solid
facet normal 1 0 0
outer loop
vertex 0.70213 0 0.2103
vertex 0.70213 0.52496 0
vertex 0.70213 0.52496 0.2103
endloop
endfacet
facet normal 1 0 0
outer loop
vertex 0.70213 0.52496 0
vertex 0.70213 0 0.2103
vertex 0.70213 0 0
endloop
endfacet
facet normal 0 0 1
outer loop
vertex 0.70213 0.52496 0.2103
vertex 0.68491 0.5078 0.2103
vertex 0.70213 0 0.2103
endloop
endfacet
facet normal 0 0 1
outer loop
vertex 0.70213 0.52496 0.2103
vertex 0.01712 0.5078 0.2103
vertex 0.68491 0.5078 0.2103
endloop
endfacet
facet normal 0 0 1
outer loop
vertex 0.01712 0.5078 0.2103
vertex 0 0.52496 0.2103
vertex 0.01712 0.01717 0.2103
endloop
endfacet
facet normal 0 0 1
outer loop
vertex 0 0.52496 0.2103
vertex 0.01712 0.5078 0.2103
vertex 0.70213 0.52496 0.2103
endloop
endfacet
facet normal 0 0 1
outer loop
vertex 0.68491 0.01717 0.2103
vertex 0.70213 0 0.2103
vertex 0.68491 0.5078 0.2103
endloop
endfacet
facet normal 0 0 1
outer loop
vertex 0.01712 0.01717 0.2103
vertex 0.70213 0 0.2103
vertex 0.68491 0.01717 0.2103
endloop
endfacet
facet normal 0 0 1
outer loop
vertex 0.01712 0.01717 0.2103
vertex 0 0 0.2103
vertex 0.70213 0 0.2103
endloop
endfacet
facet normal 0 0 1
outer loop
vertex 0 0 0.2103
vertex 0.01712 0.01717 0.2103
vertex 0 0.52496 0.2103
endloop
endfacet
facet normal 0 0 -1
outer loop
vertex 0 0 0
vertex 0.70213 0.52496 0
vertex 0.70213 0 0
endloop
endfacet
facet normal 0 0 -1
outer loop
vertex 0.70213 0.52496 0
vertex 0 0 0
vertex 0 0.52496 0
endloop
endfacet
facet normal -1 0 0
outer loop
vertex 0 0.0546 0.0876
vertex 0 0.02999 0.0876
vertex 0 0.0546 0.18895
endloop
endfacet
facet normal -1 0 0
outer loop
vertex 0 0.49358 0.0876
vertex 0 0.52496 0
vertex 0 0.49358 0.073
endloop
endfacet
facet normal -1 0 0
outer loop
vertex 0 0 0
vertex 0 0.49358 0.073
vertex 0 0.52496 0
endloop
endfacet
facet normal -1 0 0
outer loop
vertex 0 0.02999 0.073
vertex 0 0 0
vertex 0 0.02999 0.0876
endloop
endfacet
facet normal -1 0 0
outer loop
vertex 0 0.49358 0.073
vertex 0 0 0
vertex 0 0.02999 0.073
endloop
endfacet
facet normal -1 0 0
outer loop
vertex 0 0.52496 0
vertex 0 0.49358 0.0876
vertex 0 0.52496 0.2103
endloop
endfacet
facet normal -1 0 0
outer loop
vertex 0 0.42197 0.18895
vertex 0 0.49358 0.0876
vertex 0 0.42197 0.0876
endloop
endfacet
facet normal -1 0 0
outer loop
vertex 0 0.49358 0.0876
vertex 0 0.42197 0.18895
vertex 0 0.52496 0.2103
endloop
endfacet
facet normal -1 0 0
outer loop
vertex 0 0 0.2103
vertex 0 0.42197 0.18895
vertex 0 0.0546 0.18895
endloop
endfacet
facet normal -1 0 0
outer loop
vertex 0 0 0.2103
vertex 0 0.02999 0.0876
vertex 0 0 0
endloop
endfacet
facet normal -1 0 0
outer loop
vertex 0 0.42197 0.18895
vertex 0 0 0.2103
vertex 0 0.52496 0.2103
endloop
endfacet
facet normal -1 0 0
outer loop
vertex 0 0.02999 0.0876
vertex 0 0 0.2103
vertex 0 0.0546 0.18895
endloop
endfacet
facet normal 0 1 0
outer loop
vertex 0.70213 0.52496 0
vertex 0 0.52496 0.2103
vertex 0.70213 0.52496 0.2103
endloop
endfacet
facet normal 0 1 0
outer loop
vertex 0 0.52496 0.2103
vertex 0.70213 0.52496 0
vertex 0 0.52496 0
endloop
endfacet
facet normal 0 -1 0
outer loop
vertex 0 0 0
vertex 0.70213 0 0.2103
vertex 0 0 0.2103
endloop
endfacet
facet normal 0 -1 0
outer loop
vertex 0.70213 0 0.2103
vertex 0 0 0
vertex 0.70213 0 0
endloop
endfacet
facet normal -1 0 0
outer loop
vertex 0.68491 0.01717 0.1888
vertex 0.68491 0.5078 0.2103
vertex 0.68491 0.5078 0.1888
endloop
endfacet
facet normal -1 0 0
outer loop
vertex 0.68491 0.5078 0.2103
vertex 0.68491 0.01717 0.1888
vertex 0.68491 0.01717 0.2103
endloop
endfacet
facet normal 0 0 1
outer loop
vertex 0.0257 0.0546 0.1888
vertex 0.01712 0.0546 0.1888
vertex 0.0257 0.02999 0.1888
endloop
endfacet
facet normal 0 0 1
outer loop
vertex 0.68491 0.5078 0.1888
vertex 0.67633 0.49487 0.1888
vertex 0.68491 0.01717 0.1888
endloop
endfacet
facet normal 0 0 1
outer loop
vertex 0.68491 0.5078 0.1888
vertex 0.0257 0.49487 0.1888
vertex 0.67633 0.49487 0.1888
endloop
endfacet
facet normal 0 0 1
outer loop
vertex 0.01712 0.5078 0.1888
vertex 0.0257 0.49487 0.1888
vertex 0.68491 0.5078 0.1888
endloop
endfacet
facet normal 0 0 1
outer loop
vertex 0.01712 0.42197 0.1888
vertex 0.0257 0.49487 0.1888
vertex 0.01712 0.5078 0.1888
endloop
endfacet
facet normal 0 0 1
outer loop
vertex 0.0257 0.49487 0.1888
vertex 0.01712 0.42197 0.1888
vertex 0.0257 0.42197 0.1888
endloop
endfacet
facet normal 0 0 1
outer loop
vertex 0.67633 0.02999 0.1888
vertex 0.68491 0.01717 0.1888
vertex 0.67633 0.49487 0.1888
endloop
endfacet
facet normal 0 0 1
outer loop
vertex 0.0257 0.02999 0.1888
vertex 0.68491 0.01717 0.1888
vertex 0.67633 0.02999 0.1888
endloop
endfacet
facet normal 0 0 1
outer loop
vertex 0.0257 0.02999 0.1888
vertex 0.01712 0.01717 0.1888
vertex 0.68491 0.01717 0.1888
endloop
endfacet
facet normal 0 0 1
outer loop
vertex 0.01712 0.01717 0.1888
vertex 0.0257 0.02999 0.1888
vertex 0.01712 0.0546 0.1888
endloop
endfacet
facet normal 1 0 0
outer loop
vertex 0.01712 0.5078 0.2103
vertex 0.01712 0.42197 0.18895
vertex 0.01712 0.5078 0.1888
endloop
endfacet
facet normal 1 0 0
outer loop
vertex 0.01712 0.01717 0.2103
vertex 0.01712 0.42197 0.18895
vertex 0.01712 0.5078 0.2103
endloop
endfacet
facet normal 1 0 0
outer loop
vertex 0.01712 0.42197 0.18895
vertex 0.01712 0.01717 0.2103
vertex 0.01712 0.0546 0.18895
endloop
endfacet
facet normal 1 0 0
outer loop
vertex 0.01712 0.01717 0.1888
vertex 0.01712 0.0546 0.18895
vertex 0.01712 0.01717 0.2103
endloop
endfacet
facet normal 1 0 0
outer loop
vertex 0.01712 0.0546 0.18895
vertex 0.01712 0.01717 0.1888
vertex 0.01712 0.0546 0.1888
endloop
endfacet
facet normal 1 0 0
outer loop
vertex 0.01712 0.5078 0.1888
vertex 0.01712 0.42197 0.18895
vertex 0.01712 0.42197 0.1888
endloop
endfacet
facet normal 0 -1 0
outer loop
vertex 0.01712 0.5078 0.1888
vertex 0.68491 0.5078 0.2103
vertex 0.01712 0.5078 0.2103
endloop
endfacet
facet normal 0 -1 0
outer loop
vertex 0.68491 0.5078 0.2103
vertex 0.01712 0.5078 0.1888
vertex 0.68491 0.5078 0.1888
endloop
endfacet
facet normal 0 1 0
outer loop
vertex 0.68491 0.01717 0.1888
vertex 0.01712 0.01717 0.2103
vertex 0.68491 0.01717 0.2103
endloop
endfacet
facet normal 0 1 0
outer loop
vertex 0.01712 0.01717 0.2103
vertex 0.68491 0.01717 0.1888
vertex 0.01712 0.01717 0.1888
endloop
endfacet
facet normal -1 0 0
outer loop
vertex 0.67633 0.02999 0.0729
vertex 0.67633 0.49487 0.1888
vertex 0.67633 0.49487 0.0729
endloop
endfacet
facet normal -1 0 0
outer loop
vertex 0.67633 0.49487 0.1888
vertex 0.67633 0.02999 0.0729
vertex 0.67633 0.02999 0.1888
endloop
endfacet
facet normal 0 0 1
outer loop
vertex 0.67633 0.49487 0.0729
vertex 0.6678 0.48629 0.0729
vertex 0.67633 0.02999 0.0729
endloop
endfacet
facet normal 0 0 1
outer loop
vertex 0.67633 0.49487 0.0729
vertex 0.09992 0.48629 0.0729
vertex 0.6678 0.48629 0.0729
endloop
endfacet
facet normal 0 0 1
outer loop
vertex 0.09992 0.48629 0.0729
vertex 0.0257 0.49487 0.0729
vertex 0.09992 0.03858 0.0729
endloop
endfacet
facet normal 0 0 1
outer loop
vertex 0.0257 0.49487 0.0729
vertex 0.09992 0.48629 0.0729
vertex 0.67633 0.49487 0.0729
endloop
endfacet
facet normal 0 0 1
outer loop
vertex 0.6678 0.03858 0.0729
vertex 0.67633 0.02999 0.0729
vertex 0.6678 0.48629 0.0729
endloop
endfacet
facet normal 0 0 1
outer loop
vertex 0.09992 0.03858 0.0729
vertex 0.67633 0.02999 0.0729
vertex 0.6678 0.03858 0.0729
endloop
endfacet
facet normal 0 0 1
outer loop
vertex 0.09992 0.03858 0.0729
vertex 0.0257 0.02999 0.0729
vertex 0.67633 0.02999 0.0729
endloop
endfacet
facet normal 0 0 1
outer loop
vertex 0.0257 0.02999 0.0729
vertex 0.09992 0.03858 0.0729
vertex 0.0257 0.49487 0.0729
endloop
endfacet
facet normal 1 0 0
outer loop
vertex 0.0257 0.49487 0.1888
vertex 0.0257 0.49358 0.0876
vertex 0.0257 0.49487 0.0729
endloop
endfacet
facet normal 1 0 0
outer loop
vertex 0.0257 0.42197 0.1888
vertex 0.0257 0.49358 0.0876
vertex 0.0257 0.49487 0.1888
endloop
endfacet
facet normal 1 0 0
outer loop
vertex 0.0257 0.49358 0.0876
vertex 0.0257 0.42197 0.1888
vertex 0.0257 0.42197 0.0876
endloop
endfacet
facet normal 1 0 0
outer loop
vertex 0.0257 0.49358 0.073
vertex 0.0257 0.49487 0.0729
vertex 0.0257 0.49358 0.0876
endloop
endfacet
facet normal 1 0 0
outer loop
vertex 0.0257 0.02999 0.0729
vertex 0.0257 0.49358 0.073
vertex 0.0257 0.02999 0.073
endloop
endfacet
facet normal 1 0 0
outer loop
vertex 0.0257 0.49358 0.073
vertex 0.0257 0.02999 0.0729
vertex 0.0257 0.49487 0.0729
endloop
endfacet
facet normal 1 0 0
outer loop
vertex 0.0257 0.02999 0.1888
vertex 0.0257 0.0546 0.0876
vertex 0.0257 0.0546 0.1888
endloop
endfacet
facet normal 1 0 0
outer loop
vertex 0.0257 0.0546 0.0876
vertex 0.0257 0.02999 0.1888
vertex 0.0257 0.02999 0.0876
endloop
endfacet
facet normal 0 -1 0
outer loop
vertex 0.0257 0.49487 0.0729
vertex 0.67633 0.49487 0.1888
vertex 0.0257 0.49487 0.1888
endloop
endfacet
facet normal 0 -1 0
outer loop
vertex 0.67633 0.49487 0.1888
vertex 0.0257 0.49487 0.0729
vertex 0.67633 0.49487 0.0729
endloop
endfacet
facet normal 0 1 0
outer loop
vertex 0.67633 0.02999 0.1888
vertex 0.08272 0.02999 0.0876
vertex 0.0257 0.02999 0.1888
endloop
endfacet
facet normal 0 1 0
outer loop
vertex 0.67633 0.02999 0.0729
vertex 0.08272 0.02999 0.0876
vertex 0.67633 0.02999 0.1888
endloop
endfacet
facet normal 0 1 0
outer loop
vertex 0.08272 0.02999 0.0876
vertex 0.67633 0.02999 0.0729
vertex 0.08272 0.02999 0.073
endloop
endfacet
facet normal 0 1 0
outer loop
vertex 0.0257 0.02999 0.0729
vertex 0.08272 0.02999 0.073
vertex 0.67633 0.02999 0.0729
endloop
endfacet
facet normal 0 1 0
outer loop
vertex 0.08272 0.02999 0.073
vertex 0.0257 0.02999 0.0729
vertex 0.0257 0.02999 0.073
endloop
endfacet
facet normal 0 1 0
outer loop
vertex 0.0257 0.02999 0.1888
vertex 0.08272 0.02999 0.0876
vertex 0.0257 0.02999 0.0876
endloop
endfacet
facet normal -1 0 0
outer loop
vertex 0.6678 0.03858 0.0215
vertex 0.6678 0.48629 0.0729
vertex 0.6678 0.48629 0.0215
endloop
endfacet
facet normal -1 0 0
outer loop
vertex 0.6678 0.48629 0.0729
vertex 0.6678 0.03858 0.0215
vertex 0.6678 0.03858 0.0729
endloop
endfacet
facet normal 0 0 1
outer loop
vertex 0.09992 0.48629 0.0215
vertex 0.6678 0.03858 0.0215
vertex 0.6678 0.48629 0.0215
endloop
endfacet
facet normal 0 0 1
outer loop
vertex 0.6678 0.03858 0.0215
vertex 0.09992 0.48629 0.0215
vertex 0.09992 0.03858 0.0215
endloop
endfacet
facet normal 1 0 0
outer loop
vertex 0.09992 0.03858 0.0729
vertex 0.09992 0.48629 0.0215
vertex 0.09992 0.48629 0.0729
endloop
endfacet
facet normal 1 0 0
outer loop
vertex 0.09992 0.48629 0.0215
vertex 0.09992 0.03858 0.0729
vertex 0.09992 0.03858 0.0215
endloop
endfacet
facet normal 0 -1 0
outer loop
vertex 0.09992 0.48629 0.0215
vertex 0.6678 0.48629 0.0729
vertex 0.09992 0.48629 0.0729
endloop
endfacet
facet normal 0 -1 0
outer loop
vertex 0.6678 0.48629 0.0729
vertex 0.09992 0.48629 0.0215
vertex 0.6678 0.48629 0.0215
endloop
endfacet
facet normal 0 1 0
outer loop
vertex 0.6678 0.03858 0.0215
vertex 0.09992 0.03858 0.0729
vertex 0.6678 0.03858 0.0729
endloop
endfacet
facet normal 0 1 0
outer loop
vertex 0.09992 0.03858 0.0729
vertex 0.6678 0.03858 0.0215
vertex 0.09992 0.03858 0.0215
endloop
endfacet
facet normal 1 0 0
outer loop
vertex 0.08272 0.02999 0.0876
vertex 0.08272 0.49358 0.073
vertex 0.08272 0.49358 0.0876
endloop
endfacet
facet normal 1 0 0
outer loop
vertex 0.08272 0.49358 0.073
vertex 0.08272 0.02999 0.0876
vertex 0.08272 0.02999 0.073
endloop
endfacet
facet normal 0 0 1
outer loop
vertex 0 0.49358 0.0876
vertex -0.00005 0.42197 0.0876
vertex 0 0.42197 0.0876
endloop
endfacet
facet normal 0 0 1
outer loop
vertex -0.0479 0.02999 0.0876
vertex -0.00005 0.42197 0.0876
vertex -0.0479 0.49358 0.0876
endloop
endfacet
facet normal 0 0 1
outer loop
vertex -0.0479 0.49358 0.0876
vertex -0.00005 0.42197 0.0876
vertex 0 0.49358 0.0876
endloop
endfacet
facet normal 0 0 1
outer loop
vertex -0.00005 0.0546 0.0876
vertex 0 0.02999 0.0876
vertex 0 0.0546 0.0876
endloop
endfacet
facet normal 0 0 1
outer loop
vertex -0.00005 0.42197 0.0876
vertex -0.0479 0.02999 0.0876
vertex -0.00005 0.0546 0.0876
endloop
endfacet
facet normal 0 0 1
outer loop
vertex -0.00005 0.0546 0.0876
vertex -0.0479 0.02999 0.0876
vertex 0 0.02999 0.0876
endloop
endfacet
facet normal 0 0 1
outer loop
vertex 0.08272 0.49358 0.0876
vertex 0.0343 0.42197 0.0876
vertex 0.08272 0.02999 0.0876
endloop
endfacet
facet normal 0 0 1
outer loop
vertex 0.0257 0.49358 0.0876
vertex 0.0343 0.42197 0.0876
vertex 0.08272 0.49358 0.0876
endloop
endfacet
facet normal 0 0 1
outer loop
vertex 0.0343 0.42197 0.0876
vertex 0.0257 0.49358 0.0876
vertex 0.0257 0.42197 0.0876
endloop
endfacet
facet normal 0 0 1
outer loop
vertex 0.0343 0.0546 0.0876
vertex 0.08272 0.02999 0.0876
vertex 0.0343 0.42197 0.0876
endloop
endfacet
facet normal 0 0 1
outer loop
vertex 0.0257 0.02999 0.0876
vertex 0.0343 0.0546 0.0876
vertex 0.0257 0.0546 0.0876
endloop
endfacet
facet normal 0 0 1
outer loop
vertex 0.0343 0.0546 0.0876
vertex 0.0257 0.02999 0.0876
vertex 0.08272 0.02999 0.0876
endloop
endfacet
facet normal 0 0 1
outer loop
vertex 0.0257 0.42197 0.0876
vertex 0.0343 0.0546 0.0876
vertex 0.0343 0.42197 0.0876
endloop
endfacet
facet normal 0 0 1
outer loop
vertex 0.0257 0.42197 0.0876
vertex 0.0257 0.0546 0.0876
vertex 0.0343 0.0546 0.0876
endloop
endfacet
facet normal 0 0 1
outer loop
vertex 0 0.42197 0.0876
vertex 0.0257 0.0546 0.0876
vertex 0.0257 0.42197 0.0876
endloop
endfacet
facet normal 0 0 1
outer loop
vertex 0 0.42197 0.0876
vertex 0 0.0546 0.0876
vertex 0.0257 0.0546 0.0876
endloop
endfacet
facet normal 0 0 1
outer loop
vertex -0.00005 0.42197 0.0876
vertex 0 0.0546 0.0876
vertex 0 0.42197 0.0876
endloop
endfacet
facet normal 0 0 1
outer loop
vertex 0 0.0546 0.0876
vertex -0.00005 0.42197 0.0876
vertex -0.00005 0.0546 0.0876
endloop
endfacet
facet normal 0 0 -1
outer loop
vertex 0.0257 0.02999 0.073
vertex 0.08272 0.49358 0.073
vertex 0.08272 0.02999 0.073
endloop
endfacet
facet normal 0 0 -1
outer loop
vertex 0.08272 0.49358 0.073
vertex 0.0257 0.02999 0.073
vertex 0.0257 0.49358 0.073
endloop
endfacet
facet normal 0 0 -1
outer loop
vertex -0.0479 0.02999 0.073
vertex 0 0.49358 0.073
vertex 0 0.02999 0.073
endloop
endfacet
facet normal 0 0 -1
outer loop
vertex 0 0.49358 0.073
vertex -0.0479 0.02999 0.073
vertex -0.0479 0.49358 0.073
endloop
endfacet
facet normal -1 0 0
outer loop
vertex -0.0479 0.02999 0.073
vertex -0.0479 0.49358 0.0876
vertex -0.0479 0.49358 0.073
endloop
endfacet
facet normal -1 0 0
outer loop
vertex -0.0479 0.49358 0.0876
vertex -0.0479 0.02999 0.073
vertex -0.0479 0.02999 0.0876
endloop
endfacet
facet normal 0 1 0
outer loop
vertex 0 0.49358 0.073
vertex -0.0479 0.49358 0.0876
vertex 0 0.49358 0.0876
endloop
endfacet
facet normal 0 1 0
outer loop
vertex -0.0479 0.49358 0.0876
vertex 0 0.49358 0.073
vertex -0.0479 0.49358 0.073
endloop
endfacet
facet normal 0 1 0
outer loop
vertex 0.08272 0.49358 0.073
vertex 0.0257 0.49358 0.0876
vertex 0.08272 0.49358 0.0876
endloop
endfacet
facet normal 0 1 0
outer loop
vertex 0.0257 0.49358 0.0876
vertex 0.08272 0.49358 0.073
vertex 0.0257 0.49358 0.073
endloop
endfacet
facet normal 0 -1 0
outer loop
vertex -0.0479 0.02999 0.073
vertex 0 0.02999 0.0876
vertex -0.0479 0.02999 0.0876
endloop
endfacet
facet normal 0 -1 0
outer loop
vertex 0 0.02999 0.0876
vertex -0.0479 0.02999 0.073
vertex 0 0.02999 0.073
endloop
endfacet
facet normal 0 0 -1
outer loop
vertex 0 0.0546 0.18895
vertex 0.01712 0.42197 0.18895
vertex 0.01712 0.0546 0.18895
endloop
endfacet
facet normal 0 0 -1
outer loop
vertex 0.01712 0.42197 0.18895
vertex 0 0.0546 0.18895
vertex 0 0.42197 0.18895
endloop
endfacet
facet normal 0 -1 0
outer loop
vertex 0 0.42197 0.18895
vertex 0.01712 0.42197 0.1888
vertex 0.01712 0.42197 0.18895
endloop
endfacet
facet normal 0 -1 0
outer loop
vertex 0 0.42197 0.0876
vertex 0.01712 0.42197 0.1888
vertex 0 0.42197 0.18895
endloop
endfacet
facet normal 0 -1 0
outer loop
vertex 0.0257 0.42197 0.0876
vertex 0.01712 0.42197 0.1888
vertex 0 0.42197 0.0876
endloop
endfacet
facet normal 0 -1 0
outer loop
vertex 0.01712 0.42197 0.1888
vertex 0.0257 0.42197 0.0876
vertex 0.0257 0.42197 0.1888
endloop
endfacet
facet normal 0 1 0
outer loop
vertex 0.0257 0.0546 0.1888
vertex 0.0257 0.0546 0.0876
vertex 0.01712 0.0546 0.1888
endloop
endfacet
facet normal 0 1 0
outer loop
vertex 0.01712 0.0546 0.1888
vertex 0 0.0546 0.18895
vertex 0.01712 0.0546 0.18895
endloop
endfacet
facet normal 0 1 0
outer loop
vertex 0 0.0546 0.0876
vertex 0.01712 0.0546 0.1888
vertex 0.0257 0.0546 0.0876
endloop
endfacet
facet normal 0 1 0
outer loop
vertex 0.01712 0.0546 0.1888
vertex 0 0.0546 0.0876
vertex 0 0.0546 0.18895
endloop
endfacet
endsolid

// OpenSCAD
// Parameters
$fn = 32;
eps = 0.00005;

// Main body
body_x = 0.702127;
body_y = 0.524964;
body_z = 0.2103; // formed height, nominal 0.210295

// Top shallow recess
top_x_size = 0.667793;
top_y_size = 0.490631;
top_left_inset = 0.0171;
top_right_inset = 0.0172;
top_front_inset = 0.0172;
top_back_inset = 0.0172;
top_z0 = 0.1888;
top_z1 = body_z;

// Middle continuation cut
mid_x_size = 0.650626;
mid_y_size = 0.46488;
mid_left_inset = 0.0257;
mid_right_inset = 0.0258;
mid_front_inset = 0.03;
mid_back_inset = 0.0301;
mid_z0 = 0.0729;
mid_z1 = 0.1888;

// Lower offset pocket
low_x_size = 0.567882;
low_y_size = 0.447713;
low_left_inset = 0.0999;
low_right_inset = 0.0343;
low_front_inset = 0.0386;
low_back_inset = 0.0387;
low_z0 = 0.0215;
low_z1 = 0.073;

// Added side projection
proj_x_size = 0.130618;
proj_y_size = 0.463588;
proj_left_overhang = 0.0479;
proj_right_clearance = 0.6194;
proj_front_inset = 0.03;
proj_back_inset = 0.0314;
proj_z0 = 0.073;
proj_z1 = 0.0876;

// Side recess cut
side_cut_depth = 0.0343;
side_cut_y_size = 0.367372; // nominal 0.3674
side_cut_front_inset = 0.0546;
side_cut_back_inset = 0.103;
side_cut_z0 = 0.0876;
side_cut_z1 = 0.1889;

// Rounded-dimension placement helper
function balanced_start(total, size, lead, trail) =
    (lead + (total - trail - size)) / 2;

// Derived positions
top_x0 = balanced_start(body_x, top_x_size, top_left_inset, top_right_inset);
top_y0 = balanced_start(body_y, top_y_size, top_front_inset, top_back_inset);

mid_x0 = balanced_start(body_x, mid_x_size, mid_left_inset, mid_right_inset);
mid_y0 = balanced_start(body_y, mid_y_size, mid_front_inset, mid_back_inset);

low_x0 = balanced_start(body_x, low_x_size, low_left_inset, low_right_inset);
low_y0 = balanced_start(body_y, low_y_size, low_front_inset, low_back_inset);

proj_x0 = balanced_start(body_x, proj_x_size, -proj_left_overhang, proj_right_clearance);
proj_y0 = balanced_start(body_y, proj_y_size, proj_front_inset, proj_back_inset);

side_cut_y0 = balanced_start(body_y, side_cut_y_size, side_cut_front_inset, side_cut_back_inset);

// Basic box from lower-front-left corner
module box_at(p, s) {
    translate(p)
        cube(s, center=false);
}

// Main rectangular solid
module main_body() {
    box_at([0, 0, 0], [body_x, body_y, body_z]);
}

// Top recess cutter
module top_recess_cut() {
    box_at(
        [top_x0, top_y0, top_z0],
        [top_x_size, top_y_size, top_z1 - top_z0 + eps]
    );
}

// Middle continuation cutter
module middle_cut() {
    box_at(
        [mid_x0, mid_y0, mid_z0],
        [mid_x_size, mid_y_size, mid_z1 - mid_z0 + eps]
    );
}

// Lower pocket cutter
module lower_pocket_cut() {
    box_at(
        [low_x0, low_y0, low_z0],
        [low_x_size, low_y_size, low_z1 - low_z0 + eps]
    );
}

// Added lower side projection
module side_projection() {
    box_at(
        [proj_x0, proj_y0, proj_z0],
        [proj_x_size, proj_y_size, proj_z1 - proj_z0]
    );
}

// Left-edge side recess cutter
module side_recess_cut() {
    box_at(
        [-eps, side_cut_y0, side_cut_z0],
        [side_cut_depth + eps, side_cut_y_size, side_cut_z1 - side_cut_z0 + eps]
    );
}

// Body with stepped top pocket stack
module pocketed_body() {
    difference() {
        main_body();
        top_recess_cut();
        middle_cut();
        lower_pocket_cut();
    }
}

// Final model
module model() {
    difference() {
        union() {
            pocketed_body();
            side_projection();
        }
        side_recess_cut();
    }
}

model();
